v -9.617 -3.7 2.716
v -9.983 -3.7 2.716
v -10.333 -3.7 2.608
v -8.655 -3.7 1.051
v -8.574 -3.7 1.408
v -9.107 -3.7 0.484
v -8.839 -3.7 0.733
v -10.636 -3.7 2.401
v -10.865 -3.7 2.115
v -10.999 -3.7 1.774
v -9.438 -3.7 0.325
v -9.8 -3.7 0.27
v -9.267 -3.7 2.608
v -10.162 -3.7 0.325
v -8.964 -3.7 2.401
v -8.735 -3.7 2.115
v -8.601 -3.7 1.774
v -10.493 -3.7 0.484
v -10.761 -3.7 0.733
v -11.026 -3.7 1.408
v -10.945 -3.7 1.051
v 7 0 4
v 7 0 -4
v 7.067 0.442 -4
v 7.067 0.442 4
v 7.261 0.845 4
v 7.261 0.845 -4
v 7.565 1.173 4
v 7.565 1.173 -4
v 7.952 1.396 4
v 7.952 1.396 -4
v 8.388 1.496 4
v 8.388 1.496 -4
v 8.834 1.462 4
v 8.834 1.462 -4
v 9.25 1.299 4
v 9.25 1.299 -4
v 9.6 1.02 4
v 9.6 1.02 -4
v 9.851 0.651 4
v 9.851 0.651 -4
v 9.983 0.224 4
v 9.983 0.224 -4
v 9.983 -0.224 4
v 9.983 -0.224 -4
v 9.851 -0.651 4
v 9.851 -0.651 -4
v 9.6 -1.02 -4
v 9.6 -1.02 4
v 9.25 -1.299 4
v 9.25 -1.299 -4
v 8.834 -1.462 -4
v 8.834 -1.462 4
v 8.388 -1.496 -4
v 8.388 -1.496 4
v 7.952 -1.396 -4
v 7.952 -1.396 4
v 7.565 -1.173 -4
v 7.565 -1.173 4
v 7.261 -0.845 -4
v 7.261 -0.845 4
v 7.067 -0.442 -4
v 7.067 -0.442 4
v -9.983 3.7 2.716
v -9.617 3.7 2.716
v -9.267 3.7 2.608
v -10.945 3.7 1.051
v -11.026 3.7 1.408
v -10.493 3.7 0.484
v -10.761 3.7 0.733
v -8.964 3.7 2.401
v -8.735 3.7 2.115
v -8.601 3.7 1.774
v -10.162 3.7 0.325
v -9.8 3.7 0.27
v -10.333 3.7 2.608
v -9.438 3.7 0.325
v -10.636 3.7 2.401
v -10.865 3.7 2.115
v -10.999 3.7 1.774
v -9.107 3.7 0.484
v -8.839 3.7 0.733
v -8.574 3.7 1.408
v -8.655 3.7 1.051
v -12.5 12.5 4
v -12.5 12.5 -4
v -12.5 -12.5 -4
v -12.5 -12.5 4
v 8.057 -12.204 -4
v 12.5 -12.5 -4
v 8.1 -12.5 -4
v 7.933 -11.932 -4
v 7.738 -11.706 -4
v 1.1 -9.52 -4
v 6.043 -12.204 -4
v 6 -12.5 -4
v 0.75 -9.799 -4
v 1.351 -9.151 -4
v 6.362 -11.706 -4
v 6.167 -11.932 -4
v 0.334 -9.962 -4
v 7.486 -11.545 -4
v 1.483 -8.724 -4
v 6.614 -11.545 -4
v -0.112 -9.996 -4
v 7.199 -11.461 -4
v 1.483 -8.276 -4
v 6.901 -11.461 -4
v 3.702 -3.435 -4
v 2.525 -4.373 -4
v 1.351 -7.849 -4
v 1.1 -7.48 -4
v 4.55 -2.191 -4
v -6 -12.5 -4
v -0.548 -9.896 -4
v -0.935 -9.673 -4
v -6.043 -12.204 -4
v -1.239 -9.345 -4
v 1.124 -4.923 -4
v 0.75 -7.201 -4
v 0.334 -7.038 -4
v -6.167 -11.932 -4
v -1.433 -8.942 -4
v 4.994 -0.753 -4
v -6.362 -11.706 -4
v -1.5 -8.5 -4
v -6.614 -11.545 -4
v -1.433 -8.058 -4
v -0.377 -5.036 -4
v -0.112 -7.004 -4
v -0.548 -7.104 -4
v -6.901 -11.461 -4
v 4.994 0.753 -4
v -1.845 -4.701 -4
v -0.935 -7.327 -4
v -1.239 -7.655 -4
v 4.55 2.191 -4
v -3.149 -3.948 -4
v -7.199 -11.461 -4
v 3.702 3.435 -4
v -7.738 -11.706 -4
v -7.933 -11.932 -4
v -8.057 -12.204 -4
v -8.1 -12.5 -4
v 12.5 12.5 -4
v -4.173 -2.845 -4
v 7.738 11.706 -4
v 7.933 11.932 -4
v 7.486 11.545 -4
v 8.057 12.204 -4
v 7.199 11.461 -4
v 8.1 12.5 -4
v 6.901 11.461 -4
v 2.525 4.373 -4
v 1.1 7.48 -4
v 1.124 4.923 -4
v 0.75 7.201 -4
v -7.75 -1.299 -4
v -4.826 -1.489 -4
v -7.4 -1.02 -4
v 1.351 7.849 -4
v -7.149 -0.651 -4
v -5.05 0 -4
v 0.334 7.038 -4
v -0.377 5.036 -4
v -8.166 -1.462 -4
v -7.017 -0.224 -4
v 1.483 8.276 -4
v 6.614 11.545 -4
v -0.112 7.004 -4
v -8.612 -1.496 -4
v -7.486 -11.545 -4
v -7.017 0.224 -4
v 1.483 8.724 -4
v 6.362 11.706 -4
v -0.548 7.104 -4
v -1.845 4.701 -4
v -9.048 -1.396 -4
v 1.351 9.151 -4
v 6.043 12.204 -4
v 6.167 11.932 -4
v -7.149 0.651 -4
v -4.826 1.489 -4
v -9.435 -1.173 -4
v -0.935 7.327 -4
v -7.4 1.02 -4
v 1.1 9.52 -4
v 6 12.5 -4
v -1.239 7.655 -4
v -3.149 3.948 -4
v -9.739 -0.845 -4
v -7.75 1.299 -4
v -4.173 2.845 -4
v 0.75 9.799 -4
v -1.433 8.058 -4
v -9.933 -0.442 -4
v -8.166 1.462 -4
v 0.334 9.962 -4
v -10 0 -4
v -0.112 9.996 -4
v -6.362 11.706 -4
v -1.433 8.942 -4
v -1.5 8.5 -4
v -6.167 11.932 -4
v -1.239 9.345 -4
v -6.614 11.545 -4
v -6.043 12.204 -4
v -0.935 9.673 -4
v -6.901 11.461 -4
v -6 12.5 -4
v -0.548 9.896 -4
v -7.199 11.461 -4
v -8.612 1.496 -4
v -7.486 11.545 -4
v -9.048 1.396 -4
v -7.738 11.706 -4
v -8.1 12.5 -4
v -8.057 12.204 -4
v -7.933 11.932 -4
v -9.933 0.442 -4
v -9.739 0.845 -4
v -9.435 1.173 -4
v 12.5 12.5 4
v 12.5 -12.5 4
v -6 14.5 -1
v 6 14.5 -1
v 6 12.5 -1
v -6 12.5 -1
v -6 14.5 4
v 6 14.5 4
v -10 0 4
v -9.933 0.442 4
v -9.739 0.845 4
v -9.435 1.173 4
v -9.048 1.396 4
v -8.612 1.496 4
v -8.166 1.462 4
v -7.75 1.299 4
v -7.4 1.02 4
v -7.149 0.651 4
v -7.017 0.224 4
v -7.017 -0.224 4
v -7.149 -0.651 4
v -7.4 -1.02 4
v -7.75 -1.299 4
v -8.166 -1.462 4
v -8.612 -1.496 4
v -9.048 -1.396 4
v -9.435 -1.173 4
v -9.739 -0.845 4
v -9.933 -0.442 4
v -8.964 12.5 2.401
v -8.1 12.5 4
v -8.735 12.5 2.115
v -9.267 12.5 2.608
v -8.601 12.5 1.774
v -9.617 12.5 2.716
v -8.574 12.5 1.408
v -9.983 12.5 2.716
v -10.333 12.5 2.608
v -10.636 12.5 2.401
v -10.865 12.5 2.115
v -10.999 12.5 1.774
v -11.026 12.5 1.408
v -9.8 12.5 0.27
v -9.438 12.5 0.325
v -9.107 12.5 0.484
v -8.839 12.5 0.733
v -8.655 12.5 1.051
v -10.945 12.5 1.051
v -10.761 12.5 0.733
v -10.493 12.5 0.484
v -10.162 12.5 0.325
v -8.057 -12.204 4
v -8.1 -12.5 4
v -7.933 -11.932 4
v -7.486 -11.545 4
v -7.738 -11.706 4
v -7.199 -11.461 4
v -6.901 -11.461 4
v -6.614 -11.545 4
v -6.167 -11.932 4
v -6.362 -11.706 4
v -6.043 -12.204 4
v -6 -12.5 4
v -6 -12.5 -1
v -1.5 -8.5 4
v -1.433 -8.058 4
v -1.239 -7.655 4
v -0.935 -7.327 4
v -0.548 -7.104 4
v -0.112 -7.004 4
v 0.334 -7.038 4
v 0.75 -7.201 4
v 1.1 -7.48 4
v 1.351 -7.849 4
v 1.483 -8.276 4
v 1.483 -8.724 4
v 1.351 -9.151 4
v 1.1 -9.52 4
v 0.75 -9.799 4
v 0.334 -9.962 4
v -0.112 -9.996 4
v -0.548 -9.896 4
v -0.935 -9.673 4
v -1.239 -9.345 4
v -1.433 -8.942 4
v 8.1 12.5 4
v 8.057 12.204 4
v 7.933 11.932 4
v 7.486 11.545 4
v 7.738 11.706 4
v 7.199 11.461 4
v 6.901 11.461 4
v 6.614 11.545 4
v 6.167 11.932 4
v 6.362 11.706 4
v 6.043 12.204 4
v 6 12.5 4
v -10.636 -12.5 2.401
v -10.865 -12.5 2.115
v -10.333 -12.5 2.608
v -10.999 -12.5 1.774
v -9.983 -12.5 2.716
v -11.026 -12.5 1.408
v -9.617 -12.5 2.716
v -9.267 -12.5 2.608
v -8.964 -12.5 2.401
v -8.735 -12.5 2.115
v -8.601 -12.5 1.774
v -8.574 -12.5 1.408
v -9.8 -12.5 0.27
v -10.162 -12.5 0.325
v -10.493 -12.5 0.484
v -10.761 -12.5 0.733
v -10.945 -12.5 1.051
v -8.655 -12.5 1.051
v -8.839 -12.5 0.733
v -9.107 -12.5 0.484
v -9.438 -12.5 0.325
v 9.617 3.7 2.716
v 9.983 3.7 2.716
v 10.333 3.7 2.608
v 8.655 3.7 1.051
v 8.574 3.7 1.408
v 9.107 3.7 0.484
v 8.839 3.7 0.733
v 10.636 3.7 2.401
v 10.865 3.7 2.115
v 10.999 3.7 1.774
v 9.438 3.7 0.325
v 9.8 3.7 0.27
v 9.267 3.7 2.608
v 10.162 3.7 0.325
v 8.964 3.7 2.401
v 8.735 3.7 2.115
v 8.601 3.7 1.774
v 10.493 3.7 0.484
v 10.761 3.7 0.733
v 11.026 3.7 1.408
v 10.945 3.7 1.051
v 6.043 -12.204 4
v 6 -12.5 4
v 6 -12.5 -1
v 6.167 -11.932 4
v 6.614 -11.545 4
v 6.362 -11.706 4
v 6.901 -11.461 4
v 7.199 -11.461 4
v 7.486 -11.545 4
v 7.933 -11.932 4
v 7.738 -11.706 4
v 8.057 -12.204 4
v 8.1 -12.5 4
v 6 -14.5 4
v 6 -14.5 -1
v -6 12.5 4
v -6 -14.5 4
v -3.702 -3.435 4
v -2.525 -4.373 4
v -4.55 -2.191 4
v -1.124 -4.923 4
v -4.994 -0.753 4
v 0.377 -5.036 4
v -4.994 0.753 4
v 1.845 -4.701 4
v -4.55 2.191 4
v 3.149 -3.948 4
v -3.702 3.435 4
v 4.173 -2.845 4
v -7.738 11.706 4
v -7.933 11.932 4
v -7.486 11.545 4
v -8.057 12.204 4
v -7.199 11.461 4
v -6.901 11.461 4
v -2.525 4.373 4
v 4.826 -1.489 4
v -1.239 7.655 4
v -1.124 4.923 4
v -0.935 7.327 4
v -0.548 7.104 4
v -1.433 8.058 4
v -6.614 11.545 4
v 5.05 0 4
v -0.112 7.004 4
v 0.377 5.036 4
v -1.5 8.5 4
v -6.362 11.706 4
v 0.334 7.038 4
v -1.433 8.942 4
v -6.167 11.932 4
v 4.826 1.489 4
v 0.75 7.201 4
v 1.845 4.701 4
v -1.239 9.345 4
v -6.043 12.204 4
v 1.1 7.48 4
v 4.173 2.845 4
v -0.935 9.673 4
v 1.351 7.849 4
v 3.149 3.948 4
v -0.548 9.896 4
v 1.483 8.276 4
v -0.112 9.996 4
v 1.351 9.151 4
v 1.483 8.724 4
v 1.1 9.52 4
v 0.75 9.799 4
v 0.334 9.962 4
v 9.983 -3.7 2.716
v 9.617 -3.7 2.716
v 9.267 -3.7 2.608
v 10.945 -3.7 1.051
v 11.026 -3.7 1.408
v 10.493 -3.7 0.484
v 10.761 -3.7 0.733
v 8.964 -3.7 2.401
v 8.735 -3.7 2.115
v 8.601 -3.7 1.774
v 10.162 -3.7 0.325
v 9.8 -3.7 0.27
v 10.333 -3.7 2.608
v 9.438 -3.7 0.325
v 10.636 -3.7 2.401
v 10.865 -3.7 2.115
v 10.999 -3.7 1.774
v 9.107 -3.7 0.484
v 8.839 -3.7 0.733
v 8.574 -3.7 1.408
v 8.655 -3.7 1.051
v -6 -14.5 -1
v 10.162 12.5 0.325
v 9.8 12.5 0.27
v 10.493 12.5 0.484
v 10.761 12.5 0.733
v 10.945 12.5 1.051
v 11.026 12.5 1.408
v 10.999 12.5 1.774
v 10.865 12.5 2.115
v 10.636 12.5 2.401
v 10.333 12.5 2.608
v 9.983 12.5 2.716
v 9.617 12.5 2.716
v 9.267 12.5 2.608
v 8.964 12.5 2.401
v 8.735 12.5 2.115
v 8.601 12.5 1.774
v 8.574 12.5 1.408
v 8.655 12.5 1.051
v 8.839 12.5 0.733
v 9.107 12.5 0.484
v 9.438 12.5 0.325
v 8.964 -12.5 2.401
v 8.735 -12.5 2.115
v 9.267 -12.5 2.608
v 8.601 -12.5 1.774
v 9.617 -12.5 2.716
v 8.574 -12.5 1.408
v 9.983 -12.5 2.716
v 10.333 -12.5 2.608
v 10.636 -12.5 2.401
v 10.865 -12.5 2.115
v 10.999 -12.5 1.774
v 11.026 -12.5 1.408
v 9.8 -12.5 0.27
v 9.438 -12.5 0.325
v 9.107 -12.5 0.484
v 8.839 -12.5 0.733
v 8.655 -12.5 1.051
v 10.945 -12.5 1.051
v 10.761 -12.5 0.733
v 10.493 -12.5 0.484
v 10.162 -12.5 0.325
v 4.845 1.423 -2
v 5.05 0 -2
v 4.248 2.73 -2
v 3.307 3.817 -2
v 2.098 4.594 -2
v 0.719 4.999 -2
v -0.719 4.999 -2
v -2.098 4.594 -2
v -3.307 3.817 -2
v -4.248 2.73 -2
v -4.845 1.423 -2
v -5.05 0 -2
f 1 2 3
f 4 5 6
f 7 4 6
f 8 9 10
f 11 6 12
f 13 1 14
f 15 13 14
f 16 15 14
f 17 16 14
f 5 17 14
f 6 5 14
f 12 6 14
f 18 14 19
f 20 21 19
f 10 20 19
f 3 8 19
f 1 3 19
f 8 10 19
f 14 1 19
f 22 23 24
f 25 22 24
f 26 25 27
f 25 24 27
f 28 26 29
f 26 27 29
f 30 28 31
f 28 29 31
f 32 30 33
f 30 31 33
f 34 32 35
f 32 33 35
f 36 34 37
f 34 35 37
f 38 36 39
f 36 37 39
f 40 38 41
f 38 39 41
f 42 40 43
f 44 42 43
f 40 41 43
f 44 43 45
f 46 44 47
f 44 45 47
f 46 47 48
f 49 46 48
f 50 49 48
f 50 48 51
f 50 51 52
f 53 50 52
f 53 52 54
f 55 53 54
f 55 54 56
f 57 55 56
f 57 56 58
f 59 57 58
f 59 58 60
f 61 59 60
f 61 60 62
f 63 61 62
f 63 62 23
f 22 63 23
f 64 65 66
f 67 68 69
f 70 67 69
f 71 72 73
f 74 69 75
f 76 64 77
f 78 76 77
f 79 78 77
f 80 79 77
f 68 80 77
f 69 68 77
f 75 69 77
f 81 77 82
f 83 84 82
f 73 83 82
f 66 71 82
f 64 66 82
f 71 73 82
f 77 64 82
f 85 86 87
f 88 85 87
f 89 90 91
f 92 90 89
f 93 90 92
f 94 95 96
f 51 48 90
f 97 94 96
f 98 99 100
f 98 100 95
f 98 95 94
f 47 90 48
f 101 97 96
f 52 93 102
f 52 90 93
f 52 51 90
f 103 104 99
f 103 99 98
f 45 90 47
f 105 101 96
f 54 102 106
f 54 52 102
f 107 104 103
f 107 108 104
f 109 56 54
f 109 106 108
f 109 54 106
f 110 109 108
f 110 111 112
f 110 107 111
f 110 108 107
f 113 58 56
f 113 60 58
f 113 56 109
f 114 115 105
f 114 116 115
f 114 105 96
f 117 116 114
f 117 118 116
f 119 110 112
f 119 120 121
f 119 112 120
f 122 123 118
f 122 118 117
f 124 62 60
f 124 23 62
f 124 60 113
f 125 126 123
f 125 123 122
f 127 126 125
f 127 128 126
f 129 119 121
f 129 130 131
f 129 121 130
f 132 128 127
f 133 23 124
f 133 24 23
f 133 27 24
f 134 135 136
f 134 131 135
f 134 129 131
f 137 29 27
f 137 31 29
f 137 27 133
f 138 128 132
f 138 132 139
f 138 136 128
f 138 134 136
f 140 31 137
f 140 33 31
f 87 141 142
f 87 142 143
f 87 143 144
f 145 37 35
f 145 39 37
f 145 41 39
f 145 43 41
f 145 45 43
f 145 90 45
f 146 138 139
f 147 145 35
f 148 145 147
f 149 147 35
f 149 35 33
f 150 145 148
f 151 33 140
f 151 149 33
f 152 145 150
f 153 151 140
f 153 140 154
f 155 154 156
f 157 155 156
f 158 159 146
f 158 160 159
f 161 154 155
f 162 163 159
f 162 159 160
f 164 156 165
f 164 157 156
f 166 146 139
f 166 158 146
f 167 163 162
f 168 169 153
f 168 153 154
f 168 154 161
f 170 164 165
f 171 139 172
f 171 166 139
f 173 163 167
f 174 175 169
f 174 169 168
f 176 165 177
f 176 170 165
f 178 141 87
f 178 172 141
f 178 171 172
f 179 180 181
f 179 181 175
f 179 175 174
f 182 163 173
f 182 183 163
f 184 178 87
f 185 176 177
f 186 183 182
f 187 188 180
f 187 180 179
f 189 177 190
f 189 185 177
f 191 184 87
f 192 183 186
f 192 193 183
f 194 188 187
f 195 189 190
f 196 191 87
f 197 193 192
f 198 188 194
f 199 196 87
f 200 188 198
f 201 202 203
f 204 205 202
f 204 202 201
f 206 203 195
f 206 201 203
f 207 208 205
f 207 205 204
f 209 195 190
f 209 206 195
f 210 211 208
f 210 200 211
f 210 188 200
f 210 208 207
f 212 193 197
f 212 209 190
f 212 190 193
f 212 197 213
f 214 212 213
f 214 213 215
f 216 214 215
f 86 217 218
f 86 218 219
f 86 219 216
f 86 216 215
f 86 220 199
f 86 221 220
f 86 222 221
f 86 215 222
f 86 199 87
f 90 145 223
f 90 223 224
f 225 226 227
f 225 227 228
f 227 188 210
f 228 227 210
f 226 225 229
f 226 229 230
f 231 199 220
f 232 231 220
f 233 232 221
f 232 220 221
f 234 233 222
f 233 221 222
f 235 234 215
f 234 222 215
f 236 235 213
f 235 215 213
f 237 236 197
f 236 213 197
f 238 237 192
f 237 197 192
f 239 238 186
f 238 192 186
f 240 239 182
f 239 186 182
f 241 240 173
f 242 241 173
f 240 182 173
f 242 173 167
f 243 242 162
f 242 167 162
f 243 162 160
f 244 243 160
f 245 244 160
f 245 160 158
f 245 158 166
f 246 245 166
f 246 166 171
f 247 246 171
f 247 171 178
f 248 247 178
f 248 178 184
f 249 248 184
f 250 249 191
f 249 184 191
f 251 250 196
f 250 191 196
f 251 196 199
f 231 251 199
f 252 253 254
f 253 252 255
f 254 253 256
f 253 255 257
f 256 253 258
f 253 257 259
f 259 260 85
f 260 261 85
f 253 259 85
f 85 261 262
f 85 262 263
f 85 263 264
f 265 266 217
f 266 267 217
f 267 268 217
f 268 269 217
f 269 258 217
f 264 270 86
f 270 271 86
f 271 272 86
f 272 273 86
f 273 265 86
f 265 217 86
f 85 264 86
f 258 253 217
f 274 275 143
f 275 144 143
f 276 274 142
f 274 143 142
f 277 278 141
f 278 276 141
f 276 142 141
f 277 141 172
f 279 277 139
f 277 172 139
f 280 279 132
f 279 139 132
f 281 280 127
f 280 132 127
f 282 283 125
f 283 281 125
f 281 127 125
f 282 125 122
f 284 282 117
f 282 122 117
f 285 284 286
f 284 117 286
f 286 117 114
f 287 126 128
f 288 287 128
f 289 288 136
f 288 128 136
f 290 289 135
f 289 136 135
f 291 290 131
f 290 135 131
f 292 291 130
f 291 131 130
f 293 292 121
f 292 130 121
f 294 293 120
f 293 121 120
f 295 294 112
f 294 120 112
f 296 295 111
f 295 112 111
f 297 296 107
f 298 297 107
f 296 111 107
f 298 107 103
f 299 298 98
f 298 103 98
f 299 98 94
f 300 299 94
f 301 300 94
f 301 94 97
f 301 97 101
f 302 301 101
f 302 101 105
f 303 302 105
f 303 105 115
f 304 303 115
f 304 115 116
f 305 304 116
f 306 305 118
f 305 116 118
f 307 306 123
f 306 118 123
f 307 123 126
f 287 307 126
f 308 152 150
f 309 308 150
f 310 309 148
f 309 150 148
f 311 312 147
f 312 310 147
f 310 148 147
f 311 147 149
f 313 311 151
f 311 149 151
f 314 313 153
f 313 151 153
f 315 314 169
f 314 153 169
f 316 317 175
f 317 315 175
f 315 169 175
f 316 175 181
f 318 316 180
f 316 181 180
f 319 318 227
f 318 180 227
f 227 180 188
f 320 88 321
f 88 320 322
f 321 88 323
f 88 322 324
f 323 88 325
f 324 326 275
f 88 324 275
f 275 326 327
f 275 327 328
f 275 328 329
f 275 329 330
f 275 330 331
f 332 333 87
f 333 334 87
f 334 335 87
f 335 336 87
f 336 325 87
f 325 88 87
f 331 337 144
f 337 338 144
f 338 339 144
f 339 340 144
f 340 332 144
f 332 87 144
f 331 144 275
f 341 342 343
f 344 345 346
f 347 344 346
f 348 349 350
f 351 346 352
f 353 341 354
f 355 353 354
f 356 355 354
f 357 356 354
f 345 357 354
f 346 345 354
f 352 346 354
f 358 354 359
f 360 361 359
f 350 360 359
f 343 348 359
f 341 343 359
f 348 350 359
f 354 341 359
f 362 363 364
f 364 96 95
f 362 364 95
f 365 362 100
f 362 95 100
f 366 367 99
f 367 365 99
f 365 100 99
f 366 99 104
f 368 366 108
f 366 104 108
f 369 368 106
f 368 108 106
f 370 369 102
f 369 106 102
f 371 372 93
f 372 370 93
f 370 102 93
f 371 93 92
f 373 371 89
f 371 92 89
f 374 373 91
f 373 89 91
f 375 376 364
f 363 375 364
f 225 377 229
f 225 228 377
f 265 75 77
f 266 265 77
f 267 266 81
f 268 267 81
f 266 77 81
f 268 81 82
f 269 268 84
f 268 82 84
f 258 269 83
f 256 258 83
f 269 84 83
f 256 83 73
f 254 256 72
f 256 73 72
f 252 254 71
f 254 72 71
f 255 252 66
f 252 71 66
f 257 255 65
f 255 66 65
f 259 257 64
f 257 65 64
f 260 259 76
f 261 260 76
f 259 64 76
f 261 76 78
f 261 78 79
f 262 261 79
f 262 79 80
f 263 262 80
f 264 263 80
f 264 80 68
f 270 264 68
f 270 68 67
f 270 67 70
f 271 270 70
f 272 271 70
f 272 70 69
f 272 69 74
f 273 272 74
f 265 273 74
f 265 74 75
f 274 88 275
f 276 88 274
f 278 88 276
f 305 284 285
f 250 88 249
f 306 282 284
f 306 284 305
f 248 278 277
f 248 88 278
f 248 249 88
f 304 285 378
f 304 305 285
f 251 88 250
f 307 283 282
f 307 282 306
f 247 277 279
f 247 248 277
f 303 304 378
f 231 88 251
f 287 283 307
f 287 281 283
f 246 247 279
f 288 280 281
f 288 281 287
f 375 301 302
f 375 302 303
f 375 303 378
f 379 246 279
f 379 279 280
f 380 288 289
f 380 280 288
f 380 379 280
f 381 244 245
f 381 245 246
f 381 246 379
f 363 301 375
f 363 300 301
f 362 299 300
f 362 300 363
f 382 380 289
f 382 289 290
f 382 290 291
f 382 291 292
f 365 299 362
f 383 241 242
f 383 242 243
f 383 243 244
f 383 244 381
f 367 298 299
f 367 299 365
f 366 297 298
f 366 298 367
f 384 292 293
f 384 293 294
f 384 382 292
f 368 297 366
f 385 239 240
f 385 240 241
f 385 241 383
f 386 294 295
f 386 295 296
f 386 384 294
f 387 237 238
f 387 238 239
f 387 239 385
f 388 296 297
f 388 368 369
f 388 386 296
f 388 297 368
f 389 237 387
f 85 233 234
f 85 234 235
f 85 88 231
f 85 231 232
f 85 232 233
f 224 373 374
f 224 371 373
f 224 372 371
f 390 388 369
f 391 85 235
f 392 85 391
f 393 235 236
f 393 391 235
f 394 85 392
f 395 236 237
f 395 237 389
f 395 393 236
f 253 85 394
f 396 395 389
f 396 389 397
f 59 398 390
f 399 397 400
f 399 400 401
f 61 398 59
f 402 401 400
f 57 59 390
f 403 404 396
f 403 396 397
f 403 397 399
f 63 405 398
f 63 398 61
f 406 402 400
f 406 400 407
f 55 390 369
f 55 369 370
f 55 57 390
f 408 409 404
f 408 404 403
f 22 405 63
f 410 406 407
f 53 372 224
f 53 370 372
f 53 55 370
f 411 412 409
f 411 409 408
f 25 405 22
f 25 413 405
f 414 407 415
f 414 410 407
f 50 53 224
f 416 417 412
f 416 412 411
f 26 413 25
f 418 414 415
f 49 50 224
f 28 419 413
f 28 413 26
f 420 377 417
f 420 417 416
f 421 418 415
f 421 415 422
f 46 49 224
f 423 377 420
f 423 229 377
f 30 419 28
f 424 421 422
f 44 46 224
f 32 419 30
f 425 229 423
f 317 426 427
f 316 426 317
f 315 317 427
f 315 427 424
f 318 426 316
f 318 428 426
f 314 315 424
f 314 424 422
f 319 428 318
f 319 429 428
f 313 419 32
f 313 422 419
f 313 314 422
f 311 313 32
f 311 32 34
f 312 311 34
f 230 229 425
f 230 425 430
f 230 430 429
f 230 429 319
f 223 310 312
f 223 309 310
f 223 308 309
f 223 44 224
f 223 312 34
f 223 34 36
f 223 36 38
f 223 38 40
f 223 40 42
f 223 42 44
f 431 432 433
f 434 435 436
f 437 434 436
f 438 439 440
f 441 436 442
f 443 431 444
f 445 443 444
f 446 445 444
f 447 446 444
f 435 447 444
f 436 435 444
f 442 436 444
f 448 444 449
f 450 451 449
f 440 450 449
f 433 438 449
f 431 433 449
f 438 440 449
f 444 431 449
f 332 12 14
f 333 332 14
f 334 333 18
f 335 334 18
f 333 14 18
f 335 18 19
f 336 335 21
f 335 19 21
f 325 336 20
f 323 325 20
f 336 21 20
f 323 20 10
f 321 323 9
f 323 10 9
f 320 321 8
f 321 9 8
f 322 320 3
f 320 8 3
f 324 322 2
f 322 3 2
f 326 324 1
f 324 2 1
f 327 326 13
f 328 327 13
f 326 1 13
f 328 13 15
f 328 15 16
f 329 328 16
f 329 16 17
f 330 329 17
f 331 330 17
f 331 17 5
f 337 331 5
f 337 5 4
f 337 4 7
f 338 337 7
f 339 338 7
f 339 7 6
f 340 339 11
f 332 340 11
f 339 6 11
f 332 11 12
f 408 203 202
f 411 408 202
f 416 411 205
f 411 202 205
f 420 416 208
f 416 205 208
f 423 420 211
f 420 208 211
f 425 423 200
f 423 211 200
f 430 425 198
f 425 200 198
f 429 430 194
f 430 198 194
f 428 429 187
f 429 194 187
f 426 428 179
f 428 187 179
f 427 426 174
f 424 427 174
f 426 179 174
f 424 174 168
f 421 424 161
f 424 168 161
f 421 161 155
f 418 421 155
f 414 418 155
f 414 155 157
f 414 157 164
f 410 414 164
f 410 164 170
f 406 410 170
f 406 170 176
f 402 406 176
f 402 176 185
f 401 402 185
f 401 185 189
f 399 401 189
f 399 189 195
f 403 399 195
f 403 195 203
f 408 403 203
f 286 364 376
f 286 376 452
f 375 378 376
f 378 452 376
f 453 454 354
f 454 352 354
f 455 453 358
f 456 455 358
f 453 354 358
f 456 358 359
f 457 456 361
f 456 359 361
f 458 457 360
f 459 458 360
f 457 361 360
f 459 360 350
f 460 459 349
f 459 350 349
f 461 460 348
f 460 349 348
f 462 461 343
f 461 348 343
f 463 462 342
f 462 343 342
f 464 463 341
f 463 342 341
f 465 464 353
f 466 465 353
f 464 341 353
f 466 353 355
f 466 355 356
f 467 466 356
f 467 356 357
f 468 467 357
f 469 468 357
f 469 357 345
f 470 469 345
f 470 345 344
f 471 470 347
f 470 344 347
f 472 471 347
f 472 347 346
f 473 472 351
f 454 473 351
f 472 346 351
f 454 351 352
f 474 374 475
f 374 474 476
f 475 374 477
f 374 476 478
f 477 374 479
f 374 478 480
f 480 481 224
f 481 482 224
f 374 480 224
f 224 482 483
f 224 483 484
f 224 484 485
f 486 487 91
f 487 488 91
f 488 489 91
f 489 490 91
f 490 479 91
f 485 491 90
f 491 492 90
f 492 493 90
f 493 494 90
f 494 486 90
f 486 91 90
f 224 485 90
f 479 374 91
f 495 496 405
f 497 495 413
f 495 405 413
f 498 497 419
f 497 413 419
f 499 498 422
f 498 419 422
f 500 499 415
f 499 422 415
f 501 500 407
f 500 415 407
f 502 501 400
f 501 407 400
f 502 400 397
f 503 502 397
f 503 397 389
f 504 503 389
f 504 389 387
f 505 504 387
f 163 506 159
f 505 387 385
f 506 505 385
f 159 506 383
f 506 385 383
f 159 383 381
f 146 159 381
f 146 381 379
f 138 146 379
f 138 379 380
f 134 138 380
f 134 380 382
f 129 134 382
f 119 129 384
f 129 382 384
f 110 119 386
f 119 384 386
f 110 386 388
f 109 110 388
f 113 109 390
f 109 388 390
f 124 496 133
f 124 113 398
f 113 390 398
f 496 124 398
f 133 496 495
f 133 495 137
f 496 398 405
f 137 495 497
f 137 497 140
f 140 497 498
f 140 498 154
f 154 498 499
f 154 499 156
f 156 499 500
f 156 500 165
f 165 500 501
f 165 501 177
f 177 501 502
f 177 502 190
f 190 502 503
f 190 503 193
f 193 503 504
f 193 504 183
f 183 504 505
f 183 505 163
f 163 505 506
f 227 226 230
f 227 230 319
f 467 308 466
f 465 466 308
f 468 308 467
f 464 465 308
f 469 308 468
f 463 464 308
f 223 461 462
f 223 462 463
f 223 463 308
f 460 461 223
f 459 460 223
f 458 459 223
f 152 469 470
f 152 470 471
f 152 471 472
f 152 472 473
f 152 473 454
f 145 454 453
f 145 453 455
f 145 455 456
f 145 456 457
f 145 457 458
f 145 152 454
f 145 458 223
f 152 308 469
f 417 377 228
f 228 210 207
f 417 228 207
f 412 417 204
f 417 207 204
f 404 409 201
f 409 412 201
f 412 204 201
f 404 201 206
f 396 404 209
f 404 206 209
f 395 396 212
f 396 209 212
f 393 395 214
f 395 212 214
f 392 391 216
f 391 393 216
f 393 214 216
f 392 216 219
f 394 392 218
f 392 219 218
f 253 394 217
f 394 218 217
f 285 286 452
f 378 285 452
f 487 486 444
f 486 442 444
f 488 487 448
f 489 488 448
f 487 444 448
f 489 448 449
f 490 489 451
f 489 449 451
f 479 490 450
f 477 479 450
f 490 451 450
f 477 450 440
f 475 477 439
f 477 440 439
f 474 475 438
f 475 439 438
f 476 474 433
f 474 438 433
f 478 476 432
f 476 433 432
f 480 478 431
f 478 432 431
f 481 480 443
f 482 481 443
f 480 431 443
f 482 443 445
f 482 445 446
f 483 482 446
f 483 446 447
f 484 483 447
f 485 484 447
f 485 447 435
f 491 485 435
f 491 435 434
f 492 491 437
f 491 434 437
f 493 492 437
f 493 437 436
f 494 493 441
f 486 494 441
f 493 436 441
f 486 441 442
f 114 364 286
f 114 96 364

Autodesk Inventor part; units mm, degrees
ref_plane "YZ Plane" through (0, 0, 0) normal (1, 0, 0) x (0, 1, 0)
ref_plane "XZ Plane" through (0, 0, 0) normal (0, 1, 0) x (-1, 0, 0)
ref_plane "XY Plane" through (0, 0, 0) normal (0, 0, 1) x (1, 0, 0)
sketch "スケッチ1" plane through (0, 0, 0) normal (0, 0, 1) x (1, 0, 0)
  line L0 (-12.5, -12.5) -> (12.5, -12.5) construction
  line L1 (12.5, -12.5) -> (12.5, 12.5) construction
  line L2 (12.5, 12.5) -> (-12.5, 12.5) construction
  line L3 (-12.5, 12.5) -> (-12.5, -12.5) construction
  line L4 (-12.5, -12.5) -> (12.5, 12.5) construction
  line L5 (12.5, -12.5) -> (-12.5, 12.5) construction
  line L6 (-8.1, 12.5) -> (-12.5, 12.5)
  line L7 (-12.5, 12.5) -> (-12.5, 8.1)
  line L8 (8.1, 12.5) -> (12.5, 12.5)
  line L9 (12.5, 12.5) -> (12.5, 8.1)
  line L10 (-12.5, -8.1) -> (-12.5, -12.5)
  line L11 (-12.5, -12.5) -> (-8.1, -12.5)
  line L12 (8.1, -12.5) -> (12.5, -12.5)
  line L13 (12.5, -12.5) -> (12.5, -8.1)
  line L14 (-6, 12.5) -> (-6, 14.5)
  line L15 (-6, 14.5) -> (6, 14.5)
  line L16 (6, 14.5) -> (6, 12.5)
  arc A0 (-8.1, 12.5) -> (-6, 12.5) centre (-7.05, 12.5) ccw
  arc A1 (6, 12.5) -> (8.1, 12.5) centre (7.05, 12.5) ccw
  line L17 (0, 12.5) -> (0, 0) construction
  line L18 (0, 0) -> (12.5, 0) construction
  line L19 (-12.5, 6) -> (-14.5, 6) construction
  line L20 (-14.5, 6) -> (-14.5, -6) construction
  line L21 (-14.5, -6) -> (-12.5, -6) construction
  arc A2 (-12.5, 6) -> (-12.5, 8.1) centre (-12.5, 7.05) ccw
  arc A3 (-12.5, -8.1) -> (-12.5, -6) centre (-12.5, -7.05) ccw construction
  line L22 (-6, -12.5) -> (-6, -14.5)
  line L23 (-6, -14.5) -> (6, -14.5)
  line L24 (6, -14.5) -> (6, -12.5)
  arc A4 (-6, -12.5) -> (-8.1, -12.5) centre (-7.05, -12.5) ccw
  arc A5 (8.1, -12.5) -> (6, -12.5) centre (7.05, -12.5) ccw
  line L25 (12.5, 6) -> (14.5, 6) construction
  line L26 (14.5, 6) -> (14.5, -6) construction
  line L27 (14.5, -6) -> (12.5, -6) construction
  arc A6 (12.5, 8.1) -> (12.5, 6) centre (12.5, 7.05) ccw construction
  arc A7 (12.5, -6) -> (12.5, -8.1) centre (12.5, -7.05) ccw construction
  line L28 (-9.05, 12.5) -> (-5.95, 12.5) construction
  line L29 (-5.95, 12.5) -> (-5.95, 9.5) construction
  line L30 (-5.95, 9.5) -> (-9.05, 9.5) construction
  line L31 (-9.05, 9.5) -> (-9.05, 12.5) construction
  line L32 (-12.5, 9.05) -> (-9.5, 9.05) construction
  line L33 (-9.5, 5.95) -> (-12.5, 5.95) construction
  line L34 (-12.5, 5.95) -> (-12.5, 9.05) construction
  line L35 (-7.5, 12.5) -> (-7.5, 9.5) construction
  line L36 (-9.5, 7.5) -> (-12.5, 7.5) construction
  line L37 (-12.5, -12.5) -> (-12.5, 12.5)
  line L38 (12.5, -12.5) -> (12.5, 12.5)
  dimension "d0" = 25
  dimension "d1" = 1.05
  dimension "d2" = 2
  dimension "d3" = 6.5
  dimension "d4" = 3.1
  dimension "d6" = 3
  dimension "d17" = 5
  dimension "d18" = 5
  dimension "d46" = 25
extrude "押し出し1" add sketch "スケッチ1" along normal blind 4
mirror "ミラー1" about plane through (0, 0, 0) normal (0, 0, -1) of "押し出し1"
sketch "スケッチ2" plane through (-12.5, -12.5, 4) normal (0, -1, 0) x (1, 0, 0)
  line L0 (6.5, 0) -> (18.5, 0) construction
  line L1 (12.5, 0) -> (12.5, -5) construction
  line L2 (0, -8) -> (0, 0) construction
  line L3 (0, -2.5) -> (22.3, -2.5) construction
  point P0 (12.5, -4)
  point P1 (2.7, -2.5)
  point P2 (0.0223, -2.5)
  dimension "d52" = 2.7
  dimension "d53" = 2.5
hole "穴1" at (-9.8, -12.5, 1.5) at (9.8, -12.5, 1.5) direction (0, 1, 0) diameter 2.459 depth 8.8 thread size "M3x0.5" class "6H" standard "ISO Metric profile"
pattern_circular "円形状パターン1" count 2 over 360 about axis through (0, 0, -10) along (0, 0, 1) of "穴1"
sketch "スケッチ4" plane through (-8.1, -12.5, -4) normal (0, 0, -1) x (-1, 0, 0)
  circle A0 centre (-8.1, 4) radius 1.5
  line L0 (-8.1, 4) -> (-8.1, 12.5) construction
  circle A1 centre (0.4, 12.5) radius 1.5
  circle A2 centre (-8.1, 21) radius 1.5
  circle A3 centre (-16.6, 12.5) radius 1.5
  dimension "d35" = 3
  dimension "d36" = 8.5
  dimension "d39" = 360
extrude "押し出し3" cut sketch "スケッチ4" against normal through all
sketch "スケッチ5" plane through (-8.1, -12.5, -4) normal (0, 0, -1) x (-1, 0, 0)
  circle A0 centre (-8.1, 12.5) radius 5.05
  dimension "d43" = 10.1
extrude "押し出し4" cut sketch "スケッチ5" against normal blind 2
sketch "スケッチ6" plane through (0, 0, 4) normal (0, 0, 1) x (1, 0, 0)
  circle A0 centre (8.5, 0) radius 1.5 construction
  circle A1 centre (0, 8.5) radius 1.5 construction
  circle A2 centre (-8.5, 0) radius 1.5 construction
  circle A3 centre (0, -8.5) radius 1.5 construction
  line L0 (0, -8.5) -> (0, 8.5) construction
  line L1 (8.5, 0) -> (-8.5, 0) construction
  circle A4 centre (0, 0) radius 5.05
  dimension "d47" = 10.1
extrude "押し出し5" cut sketch "スケッチ6" against normal up to surface (8 mm away)
sketch "スケッチ8" plane through (6, 14.5, -4) normal (0, 0, -1) x (-1, 0, 0)
  line L0 (0, -29) -> (0, -27) projected
  line L1 (12, -29) -> (0, -29) projected
  line L2 (12, -27) -> (12, -29) projected
  line L3 (0, 0) -> (12, 0) projected
  line L4 (0, -2) -> (0, 0) projected
  line L5 (12, 0) -> (12, -2) projected
  line L6 (0, -27) -> (12, -27)
  line L7 (0, -2) -> (12, -2)
  point P0 (6, -14.5)
extrude "押し出し6" cut sketch "スケッチ8" against normal blind 3
equation "\"d18\" = d17"
properties part number "頭_サーボホーンフレーム" material "アセタール樹脂、黒"
